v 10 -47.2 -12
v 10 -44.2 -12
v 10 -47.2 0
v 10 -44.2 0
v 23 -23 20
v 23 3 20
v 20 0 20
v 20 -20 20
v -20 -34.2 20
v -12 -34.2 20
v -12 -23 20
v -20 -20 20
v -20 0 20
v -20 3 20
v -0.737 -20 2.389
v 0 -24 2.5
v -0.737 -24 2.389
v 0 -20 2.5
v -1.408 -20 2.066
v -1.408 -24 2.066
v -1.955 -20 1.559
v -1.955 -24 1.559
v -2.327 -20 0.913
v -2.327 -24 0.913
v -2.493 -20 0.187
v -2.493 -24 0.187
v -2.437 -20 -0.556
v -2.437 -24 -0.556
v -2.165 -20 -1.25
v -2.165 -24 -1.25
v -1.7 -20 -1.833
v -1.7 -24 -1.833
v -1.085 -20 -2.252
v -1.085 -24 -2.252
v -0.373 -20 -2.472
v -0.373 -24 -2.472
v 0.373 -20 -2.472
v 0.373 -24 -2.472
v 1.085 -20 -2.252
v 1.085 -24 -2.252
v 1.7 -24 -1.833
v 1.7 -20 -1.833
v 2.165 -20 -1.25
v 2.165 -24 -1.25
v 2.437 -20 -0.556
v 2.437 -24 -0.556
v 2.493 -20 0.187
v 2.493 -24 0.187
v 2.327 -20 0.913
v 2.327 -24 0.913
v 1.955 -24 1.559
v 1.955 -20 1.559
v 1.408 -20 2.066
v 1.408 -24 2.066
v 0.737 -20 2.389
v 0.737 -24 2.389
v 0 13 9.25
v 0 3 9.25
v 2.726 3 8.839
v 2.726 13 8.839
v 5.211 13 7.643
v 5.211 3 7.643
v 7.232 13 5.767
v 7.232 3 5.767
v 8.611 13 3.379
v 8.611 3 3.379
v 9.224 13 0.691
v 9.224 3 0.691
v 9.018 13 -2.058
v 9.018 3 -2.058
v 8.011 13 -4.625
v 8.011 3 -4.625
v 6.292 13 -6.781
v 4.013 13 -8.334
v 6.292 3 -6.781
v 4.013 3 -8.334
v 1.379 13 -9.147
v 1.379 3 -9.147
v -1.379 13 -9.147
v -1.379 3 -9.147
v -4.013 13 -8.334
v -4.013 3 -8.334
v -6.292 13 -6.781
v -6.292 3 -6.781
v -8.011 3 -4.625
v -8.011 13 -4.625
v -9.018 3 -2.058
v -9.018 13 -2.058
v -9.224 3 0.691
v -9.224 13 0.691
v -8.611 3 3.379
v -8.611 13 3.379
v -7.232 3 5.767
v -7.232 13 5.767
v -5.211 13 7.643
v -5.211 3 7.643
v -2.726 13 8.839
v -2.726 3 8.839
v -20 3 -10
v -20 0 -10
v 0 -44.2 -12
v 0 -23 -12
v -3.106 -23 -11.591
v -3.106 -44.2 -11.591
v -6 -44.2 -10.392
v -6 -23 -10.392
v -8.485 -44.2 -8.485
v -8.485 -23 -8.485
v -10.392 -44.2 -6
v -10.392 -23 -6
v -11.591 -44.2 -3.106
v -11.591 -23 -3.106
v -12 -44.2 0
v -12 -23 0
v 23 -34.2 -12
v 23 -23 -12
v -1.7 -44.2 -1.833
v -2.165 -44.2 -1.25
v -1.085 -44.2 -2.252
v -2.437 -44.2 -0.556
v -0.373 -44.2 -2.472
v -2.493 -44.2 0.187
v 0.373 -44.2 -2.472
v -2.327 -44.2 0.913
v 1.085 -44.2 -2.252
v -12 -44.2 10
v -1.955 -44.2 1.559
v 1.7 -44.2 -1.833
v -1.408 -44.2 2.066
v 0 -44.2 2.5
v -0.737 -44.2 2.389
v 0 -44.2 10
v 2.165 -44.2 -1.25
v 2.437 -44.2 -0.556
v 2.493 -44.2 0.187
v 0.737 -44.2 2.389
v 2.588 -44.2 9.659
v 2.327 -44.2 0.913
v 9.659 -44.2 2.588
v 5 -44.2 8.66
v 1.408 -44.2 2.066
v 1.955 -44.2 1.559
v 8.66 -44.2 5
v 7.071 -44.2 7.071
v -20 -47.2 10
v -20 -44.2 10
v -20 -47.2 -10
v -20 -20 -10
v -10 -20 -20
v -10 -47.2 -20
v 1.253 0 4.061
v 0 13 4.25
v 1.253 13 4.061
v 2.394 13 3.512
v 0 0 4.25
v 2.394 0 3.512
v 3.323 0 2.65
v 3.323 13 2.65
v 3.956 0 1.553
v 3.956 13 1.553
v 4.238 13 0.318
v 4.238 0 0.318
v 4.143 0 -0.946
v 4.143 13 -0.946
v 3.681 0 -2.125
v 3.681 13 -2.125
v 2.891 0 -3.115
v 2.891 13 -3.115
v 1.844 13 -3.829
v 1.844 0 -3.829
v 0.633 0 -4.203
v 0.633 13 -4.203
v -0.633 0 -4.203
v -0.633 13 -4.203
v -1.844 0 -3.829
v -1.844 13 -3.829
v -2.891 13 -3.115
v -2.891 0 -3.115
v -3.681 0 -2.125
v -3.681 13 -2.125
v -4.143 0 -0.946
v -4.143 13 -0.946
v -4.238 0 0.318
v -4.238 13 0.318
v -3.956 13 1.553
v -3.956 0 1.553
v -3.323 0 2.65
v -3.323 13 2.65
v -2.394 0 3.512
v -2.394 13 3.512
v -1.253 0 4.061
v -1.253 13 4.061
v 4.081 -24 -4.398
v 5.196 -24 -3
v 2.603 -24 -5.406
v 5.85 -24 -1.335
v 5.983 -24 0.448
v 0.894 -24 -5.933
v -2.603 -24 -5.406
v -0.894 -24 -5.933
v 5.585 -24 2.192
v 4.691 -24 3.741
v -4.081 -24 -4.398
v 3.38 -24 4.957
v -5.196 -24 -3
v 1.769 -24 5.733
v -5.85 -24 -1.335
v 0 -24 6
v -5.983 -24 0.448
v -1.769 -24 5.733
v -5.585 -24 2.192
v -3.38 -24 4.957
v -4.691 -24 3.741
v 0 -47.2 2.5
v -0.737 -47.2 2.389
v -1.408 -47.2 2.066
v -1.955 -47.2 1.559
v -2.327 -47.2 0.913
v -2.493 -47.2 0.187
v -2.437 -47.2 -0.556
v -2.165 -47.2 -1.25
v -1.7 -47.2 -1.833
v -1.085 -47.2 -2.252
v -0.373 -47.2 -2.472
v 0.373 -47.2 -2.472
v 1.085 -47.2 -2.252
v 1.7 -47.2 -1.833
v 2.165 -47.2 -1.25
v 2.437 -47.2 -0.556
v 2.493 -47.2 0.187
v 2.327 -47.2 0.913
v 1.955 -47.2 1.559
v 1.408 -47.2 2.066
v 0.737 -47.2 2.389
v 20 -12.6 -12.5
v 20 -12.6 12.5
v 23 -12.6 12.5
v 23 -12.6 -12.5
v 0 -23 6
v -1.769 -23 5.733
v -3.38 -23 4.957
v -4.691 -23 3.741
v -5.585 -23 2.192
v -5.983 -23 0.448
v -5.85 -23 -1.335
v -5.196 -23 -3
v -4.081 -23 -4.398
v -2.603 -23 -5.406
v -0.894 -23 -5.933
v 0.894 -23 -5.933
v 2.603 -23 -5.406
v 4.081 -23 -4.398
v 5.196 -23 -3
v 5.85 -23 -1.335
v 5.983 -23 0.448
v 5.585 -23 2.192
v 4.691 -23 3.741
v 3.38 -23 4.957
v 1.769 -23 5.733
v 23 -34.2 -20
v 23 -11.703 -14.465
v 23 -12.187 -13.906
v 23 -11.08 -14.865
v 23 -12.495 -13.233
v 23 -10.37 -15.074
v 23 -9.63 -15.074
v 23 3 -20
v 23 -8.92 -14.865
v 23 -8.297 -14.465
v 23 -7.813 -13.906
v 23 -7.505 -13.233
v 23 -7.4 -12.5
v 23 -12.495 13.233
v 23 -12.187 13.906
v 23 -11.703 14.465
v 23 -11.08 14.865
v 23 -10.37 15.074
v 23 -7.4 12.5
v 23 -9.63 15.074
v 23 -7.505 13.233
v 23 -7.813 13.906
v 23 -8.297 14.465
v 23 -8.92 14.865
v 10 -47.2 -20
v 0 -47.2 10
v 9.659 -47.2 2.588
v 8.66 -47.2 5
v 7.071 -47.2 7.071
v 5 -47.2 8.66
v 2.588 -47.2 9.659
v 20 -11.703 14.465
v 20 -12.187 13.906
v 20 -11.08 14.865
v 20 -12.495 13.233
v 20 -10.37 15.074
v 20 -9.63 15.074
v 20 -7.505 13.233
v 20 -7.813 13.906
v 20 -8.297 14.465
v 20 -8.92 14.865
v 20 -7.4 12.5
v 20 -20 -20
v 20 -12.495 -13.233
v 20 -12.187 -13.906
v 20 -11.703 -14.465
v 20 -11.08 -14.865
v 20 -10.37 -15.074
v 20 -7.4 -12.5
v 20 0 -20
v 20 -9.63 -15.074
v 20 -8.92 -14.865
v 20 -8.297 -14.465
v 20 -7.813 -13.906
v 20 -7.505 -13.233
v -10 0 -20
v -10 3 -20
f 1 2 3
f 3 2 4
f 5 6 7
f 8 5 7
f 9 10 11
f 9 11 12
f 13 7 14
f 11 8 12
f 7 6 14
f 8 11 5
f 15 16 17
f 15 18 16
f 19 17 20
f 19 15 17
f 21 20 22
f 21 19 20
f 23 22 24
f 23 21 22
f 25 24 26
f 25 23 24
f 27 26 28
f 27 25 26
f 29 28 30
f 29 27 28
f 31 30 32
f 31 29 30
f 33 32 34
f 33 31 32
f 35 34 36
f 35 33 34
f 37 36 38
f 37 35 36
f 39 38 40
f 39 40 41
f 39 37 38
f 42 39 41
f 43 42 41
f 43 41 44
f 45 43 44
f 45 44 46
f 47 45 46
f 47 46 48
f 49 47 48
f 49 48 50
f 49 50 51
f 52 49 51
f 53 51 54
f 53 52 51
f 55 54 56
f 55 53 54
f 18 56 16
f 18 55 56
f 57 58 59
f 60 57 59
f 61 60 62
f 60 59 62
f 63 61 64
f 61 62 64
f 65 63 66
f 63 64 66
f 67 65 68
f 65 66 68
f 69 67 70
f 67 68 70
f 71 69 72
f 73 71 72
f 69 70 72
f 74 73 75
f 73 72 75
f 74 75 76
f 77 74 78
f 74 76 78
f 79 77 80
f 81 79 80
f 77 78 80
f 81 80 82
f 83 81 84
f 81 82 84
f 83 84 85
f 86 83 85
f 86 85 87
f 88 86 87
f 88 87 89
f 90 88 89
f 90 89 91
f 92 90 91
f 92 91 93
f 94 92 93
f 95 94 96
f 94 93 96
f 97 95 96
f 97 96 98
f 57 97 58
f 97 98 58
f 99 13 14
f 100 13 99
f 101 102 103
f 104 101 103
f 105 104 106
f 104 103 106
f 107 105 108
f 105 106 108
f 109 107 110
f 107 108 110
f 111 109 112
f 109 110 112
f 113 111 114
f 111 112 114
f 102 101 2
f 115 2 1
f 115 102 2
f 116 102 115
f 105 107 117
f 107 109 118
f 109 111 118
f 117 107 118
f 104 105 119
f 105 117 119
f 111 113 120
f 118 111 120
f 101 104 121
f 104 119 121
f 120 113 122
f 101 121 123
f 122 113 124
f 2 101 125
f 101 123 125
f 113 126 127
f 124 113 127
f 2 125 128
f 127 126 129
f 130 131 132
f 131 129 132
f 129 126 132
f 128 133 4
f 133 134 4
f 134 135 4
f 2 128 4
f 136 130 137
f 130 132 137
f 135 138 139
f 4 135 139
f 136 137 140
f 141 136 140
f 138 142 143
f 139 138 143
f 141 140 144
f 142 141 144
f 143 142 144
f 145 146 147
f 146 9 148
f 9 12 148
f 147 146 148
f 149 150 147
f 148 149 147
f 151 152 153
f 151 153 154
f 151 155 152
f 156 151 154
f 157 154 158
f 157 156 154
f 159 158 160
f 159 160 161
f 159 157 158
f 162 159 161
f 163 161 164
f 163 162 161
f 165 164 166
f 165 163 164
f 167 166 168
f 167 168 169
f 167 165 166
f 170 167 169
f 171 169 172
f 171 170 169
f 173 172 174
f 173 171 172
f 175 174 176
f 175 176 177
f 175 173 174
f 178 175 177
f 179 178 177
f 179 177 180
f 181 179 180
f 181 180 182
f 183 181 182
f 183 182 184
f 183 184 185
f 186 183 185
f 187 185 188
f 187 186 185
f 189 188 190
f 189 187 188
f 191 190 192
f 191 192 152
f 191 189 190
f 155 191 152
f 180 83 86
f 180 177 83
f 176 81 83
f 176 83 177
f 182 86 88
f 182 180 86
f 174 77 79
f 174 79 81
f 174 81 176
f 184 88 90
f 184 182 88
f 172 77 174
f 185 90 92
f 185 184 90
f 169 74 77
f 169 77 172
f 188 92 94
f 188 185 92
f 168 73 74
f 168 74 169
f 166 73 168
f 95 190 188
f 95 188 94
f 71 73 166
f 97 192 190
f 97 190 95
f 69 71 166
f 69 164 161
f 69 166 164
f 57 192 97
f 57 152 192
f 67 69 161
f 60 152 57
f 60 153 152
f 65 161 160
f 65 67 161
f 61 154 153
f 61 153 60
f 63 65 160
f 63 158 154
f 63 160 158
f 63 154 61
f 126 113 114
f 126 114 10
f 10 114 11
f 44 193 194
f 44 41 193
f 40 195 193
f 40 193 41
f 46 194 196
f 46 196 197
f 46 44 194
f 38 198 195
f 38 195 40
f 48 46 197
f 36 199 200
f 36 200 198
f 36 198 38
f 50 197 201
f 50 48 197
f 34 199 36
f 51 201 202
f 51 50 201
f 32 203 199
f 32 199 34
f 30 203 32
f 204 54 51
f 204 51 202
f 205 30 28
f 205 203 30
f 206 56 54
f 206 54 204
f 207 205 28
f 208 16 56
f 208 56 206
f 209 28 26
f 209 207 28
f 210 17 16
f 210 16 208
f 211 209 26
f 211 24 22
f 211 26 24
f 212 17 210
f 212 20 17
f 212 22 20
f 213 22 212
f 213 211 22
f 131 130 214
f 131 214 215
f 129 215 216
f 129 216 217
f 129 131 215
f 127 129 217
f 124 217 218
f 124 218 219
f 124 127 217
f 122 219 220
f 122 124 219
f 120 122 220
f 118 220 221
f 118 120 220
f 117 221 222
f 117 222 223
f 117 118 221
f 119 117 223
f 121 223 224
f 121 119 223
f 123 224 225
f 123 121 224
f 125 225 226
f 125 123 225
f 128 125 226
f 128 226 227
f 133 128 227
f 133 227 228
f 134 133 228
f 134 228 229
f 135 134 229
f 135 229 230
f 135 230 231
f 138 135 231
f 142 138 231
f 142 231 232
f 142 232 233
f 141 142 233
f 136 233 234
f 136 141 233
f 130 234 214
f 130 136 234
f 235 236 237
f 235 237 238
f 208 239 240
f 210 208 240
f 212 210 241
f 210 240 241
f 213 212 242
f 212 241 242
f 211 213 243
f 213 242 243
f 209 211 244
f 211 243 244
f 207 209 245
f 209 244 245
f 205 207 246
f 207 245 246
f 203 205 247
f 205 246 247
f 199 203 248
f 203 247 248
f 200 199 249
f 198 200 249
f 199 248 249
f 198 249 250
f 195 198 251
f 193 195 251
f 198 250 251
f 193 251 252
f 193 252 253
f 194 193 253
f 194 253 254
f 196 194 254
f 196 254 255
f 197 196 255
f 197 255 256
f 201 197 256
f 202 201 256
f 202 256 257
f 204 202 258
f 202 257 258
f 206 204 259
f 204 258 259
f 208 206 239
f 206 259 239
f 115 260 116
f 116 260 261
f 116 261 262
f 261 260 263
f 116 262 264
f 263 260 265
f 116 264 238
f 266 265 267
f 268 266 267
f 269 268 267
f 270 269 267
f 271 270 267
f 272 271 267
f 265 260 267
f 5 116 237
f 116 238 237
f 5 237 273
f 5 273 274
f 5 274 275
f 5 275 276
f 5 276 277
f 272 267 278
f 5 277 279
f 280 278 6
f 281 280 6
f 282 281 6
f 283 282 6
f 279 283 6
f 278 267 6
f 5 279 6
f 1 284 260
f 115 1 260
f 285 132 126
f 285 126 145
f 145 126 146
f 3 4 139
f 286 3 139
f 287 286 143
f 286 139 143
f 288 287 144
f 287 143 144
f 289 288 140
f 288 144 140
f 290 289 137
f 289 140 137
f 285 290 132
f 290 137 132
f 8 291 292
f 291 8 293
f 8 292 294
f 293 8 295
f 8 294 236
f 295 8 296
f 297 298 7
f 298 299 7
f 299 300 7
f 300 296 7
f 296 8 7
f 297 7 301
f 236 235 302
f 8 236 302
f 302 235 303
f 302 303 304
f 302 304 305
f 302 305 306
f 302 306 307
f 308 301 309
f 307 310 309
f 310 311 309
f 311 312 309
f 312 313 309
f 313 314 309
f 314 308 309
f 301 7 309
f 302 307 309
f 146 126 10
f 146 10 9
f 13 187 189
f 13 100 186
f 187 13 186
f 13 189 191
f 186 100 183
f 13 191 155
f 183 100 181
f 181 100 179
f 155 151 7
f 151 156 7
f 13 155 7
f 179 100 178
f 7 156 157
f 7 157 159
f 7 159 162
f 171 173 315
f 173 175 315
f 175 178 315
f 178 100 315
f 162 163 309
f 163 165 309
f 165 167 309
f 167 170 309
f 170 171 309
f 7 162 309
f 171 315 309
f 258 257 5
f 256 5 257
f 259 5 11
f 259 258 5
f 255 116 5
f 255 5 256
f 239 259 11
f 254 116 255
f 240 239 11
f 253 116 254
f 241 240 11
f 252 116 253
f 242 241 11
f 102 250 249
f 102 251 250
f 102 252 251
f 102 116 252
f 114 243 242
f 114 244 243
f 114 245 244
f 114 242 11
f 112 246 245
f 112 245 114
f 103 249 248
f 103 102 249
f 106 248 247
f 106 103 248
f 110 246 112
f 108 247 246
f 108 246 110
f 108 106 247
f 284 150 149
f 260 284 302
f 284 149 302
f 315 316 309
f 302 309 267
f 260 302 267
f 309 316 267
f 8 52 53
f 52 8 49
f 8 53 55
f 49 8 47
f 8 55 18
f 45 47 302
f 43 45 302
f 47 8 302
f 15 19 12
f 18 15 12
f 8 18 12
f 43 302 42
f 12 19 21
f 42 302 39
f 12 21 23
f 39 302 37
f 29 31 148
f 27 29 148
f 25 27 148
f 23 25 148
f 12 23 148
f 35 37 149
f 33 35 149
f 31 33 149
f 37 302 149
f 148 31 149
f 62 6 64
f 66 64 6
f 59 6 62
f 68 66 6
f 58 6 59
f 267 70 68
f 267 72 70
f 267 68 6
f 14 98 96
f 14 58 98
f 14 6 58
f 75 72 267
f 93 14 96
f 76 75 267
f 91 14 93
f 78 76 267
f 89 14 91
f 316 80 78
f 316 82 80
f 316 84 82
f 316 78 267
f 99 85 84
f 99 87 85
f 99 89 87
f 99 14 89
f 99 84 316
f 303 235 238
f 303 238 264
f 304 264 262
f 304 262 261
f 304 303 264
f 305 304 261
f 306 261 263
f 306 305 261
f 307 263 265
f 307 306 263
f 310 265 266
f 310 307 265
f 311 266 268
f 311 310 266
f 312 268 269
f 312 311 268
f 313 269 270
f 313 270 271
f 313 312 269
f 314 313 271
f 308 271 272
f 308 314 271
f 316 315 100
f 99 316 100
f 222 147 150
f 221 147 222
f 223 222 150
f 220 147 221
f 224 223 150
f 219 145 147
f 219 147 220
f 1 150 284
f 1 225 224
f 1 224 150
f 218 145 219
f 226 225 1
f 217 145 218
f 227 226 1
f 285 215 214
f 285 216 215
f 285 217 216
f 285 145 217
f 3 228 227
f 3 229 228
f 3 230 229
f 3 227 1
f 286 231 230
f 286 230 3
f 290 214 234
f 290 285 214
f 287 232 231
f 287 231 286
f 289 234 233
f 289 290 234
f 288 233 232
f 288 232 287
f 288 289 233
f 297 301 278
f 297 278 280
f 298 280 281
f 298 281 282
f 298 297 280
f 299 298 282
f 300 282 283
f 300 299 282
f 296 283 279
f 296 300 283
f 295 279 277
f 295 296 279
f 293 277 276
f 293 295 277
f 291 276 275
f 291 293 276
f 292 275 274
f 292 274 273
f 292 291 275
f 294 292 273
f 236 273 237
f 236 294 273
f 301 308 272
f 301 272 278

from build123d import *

# Parameters (mm, degrees)
SKETCH1_W           = 40
SKETCH1_H           = 40
SKETCH1_R           = 4.25
BOSS_EXTRUDE1_DEPTH = 3
SKETCH2_R           = 9.25
SKETCH2_R_2         = 4.25
BOSS_EXTRUDE2_DEPTH = 10
SKETCH3_W           = 40
SKETCH3_H           = 23
BOSS_EXTRUDE3_DEPTH = 3
CUT_EXTRUDE1_DEPTH  = 3
SKETCH5_W           = 43
SKETCH5_H           = 40
BOSS_EXTRUDE4_DEPTH = 3
SKETCH6_R           = 2.5
CUT_EXTRUDE2_DEPTH  = 10
SKETCH7_R           = 6
SKETCH7_R_2         = 2.5
BOSS_EXTRUDE5_DEPTH = 1
BOSS_EXTRUDE6_DEPTH = 21.2
CHAMFER2_SIZE       = 10
SKETCH10_R          = 2.5
BOSS_EXTRUDE7_DEPTH = 3
CUT_EXTRUDE3_DEPTH  = 31
BOSS_EXTRUDE8_DEPTH = 8


with BuildPart() as part:
    # Sketch1 → Boss-Extrude1 (new body)
    with BuildSketch(Plane(origin=(0, 0, 0), x_dir=(1, 0, 0), z_dir=(0, 1, 0))):
        Rectangle(SKETCH1_W, SKETCH1_H)
        with Locations(Location((0, 0, 0), (0, 0, 270))):
            Circle(SKETCH1_R, mode=Mode.SUBTRACT)
    extrude(amount=BOSS_EXTRUDE1_DEPTH)

    # Sketch2 → Boss-Extrude2 (add)
    with BuildSketch(Plane(origin=(0, 3, 0), x_dir=(1, 0, 0), z_dir=(0, 1, 0))):
        with Locations(Location((0, 0, 0), (0, 0, 270))):
            Circle(SKETCH2_R)
        with Locations(Location((0, 0, 0), (0, 0, 270))):
            Circle(SKETCH2_R_2, mode=Mode.SUBTRACT)
    extrude(amount=BOSS_EXTRUDE2_DEPTH)

    # Sketch3 → Boss-Extrude3 (add)
    with BuildSketch(Plane(origin=(20, 0, 0), x_dir=(0, 0, -1), z_dir=(1, 0, 0))):
        with Locations((0, -8.5)):
            Rectangle(SKETCH3_W, SKETCH3_H)
    extrude(amount=BOSS_EXTRUDE3_DEPTH)

    # Sketch4 → Cut-Extrude1 (cut)
    with BuildSketch(Plane.ZY.offset(-20)):
        with BuildLine():
            Line((-12.5, -7.4), (12.5, -7.4))
            ThreePointArc((12.5, -7.4), (15.1, -10), (12.5, -12.6))
            Line((12.5, -12.6), (-12.5, -12.6))
            ThreePointArc((-12.5, -12.6), (-15.1, -10), (-12.5, -7.4))
        make_face()
    extrude(amount=-CUT_EXTRUDE1_DEPTH, mode=Mode.SUBTRACT)

    # Sketch5 → Boss-Extrude4 (add)
    with BuildSketch(Plane(origin=(0, -20, 0), x_dir=(-1, 0, 0), z_dir=(0, -1, 0))):
        with Locations((-1.5, 0)):
            Rectangle(SKETCH5_W, SKETCH5_H)
    extrude(amount=BOSS_EXTRUDE4_DEPTH)

    # Sketch6 → Cut-Extrude2 (cut)
    with BuildSketch(Plane(origin=(0, -20, 0), x_dir=(1, 0, 0), z_dir=(0, 1, 0))):
        with Locations(Location((0, 0, 0), (0, 0, 270))):
            Circle(SKETCH6_R)
    extrude(amount=-CUT_EXTRUDE2_DEPTH, mode=Mode.SUBTRACT)

    # Sketch7 → Boss-Extrude5 (add)
    with BuildSketch(Plane(origin=(0, -23, 0), x_dir=(-1, 0, 0), z_dir=(0, -1, 0))):
        with Locations(Location((0, 0, 0), (0, 0, 270))):
            Circle(SKETCH7_R)
        with Locations(Location((0, 0, 0), (0, 0, 270))):
            Circle(SKETCH7_R_2, mode=Mode.SUBTRACT)
    extrude(amount=BOSS_EXTRUDE5_DEPTH)

    # Sketch9 → Boss-Extrude6 (add)
    with BuildSketch(Plane.XZ.offset(23)):
        with BuildLine():
            Line((23, -12), (0, -12))
            ThreePointArc((0, -12), (-8.485281374, -8.485281374), (-12, 0))
            Line((-12, 0), (-12, 20))
            Line((-12, 20), (-20, 20))
            Line((-20, 20), (-20, -10))
            Line((-20, -10), (-10, -20))
            Line((-10, -20), (23, -20))
            Line((23, -20), (23, -12))
        make_face()
    extrude(amount=BOSS_EXTRUDE6_DEPTH)

    # Chamfer2
    chamfer2_edges = [part.edges().sort_by_distance(p)[0] for p in [
        (-16, -44.2, 20),
        (23, -44.2, -16),
    ]]
    chamfer(chamfer2_edges, length=CHAMFER2_SIZE)

    # Sketch10 → Boss-Extrude7 (add)
    with BuildSketch(Plane.XZ.offset(44.2)):
        with BuildLine():
            Line((0, 10), (-12, 10))
            Line((-12, 10), (-20, 10))
            Line((-20, 10), (-20, -10))
            Line((-20, -10), (-10, -20))
            Line((-10, -20), (10, -20))
            Line((10, -20), (10, 0))
            ThreePointArc((10, 0), (7.071067812, 7.071067812), (0, 10))
        make_face()
        with Locations(Location((0, 0, 0), (0, 0, 90))):
            Circle(SKETCH10_R, mode=Mode.SUBTRACT)
    extrude(amount=BOSS_EXTRUDE7_DEPTH)

    # Sketch11 → Cut-Extrude3 (cut)
    with BuildSketch(Plane.XZ.offset(23)):
        Polygon((-10, -20), (-20, -10), (-20, -20), align=None)
    extrude(amount=-CUT_EXTRUDE3_DEPTH, mode=Mode.SUBTRACT)

    # Sketch12 → Boss-Extrude8 (add)
    with BuildSketch(Plane(origin=(0, 0, -20), x_dir=(-1, 0, 0), z_dir=(0, 0, -1))):
        Polygon((-10, -47.2), (-13, -44.2), (-10, -44.2), align=None)
    extrude(amount=-BOSS_EXTRUDE8_DEPTH)


solid = part.part
